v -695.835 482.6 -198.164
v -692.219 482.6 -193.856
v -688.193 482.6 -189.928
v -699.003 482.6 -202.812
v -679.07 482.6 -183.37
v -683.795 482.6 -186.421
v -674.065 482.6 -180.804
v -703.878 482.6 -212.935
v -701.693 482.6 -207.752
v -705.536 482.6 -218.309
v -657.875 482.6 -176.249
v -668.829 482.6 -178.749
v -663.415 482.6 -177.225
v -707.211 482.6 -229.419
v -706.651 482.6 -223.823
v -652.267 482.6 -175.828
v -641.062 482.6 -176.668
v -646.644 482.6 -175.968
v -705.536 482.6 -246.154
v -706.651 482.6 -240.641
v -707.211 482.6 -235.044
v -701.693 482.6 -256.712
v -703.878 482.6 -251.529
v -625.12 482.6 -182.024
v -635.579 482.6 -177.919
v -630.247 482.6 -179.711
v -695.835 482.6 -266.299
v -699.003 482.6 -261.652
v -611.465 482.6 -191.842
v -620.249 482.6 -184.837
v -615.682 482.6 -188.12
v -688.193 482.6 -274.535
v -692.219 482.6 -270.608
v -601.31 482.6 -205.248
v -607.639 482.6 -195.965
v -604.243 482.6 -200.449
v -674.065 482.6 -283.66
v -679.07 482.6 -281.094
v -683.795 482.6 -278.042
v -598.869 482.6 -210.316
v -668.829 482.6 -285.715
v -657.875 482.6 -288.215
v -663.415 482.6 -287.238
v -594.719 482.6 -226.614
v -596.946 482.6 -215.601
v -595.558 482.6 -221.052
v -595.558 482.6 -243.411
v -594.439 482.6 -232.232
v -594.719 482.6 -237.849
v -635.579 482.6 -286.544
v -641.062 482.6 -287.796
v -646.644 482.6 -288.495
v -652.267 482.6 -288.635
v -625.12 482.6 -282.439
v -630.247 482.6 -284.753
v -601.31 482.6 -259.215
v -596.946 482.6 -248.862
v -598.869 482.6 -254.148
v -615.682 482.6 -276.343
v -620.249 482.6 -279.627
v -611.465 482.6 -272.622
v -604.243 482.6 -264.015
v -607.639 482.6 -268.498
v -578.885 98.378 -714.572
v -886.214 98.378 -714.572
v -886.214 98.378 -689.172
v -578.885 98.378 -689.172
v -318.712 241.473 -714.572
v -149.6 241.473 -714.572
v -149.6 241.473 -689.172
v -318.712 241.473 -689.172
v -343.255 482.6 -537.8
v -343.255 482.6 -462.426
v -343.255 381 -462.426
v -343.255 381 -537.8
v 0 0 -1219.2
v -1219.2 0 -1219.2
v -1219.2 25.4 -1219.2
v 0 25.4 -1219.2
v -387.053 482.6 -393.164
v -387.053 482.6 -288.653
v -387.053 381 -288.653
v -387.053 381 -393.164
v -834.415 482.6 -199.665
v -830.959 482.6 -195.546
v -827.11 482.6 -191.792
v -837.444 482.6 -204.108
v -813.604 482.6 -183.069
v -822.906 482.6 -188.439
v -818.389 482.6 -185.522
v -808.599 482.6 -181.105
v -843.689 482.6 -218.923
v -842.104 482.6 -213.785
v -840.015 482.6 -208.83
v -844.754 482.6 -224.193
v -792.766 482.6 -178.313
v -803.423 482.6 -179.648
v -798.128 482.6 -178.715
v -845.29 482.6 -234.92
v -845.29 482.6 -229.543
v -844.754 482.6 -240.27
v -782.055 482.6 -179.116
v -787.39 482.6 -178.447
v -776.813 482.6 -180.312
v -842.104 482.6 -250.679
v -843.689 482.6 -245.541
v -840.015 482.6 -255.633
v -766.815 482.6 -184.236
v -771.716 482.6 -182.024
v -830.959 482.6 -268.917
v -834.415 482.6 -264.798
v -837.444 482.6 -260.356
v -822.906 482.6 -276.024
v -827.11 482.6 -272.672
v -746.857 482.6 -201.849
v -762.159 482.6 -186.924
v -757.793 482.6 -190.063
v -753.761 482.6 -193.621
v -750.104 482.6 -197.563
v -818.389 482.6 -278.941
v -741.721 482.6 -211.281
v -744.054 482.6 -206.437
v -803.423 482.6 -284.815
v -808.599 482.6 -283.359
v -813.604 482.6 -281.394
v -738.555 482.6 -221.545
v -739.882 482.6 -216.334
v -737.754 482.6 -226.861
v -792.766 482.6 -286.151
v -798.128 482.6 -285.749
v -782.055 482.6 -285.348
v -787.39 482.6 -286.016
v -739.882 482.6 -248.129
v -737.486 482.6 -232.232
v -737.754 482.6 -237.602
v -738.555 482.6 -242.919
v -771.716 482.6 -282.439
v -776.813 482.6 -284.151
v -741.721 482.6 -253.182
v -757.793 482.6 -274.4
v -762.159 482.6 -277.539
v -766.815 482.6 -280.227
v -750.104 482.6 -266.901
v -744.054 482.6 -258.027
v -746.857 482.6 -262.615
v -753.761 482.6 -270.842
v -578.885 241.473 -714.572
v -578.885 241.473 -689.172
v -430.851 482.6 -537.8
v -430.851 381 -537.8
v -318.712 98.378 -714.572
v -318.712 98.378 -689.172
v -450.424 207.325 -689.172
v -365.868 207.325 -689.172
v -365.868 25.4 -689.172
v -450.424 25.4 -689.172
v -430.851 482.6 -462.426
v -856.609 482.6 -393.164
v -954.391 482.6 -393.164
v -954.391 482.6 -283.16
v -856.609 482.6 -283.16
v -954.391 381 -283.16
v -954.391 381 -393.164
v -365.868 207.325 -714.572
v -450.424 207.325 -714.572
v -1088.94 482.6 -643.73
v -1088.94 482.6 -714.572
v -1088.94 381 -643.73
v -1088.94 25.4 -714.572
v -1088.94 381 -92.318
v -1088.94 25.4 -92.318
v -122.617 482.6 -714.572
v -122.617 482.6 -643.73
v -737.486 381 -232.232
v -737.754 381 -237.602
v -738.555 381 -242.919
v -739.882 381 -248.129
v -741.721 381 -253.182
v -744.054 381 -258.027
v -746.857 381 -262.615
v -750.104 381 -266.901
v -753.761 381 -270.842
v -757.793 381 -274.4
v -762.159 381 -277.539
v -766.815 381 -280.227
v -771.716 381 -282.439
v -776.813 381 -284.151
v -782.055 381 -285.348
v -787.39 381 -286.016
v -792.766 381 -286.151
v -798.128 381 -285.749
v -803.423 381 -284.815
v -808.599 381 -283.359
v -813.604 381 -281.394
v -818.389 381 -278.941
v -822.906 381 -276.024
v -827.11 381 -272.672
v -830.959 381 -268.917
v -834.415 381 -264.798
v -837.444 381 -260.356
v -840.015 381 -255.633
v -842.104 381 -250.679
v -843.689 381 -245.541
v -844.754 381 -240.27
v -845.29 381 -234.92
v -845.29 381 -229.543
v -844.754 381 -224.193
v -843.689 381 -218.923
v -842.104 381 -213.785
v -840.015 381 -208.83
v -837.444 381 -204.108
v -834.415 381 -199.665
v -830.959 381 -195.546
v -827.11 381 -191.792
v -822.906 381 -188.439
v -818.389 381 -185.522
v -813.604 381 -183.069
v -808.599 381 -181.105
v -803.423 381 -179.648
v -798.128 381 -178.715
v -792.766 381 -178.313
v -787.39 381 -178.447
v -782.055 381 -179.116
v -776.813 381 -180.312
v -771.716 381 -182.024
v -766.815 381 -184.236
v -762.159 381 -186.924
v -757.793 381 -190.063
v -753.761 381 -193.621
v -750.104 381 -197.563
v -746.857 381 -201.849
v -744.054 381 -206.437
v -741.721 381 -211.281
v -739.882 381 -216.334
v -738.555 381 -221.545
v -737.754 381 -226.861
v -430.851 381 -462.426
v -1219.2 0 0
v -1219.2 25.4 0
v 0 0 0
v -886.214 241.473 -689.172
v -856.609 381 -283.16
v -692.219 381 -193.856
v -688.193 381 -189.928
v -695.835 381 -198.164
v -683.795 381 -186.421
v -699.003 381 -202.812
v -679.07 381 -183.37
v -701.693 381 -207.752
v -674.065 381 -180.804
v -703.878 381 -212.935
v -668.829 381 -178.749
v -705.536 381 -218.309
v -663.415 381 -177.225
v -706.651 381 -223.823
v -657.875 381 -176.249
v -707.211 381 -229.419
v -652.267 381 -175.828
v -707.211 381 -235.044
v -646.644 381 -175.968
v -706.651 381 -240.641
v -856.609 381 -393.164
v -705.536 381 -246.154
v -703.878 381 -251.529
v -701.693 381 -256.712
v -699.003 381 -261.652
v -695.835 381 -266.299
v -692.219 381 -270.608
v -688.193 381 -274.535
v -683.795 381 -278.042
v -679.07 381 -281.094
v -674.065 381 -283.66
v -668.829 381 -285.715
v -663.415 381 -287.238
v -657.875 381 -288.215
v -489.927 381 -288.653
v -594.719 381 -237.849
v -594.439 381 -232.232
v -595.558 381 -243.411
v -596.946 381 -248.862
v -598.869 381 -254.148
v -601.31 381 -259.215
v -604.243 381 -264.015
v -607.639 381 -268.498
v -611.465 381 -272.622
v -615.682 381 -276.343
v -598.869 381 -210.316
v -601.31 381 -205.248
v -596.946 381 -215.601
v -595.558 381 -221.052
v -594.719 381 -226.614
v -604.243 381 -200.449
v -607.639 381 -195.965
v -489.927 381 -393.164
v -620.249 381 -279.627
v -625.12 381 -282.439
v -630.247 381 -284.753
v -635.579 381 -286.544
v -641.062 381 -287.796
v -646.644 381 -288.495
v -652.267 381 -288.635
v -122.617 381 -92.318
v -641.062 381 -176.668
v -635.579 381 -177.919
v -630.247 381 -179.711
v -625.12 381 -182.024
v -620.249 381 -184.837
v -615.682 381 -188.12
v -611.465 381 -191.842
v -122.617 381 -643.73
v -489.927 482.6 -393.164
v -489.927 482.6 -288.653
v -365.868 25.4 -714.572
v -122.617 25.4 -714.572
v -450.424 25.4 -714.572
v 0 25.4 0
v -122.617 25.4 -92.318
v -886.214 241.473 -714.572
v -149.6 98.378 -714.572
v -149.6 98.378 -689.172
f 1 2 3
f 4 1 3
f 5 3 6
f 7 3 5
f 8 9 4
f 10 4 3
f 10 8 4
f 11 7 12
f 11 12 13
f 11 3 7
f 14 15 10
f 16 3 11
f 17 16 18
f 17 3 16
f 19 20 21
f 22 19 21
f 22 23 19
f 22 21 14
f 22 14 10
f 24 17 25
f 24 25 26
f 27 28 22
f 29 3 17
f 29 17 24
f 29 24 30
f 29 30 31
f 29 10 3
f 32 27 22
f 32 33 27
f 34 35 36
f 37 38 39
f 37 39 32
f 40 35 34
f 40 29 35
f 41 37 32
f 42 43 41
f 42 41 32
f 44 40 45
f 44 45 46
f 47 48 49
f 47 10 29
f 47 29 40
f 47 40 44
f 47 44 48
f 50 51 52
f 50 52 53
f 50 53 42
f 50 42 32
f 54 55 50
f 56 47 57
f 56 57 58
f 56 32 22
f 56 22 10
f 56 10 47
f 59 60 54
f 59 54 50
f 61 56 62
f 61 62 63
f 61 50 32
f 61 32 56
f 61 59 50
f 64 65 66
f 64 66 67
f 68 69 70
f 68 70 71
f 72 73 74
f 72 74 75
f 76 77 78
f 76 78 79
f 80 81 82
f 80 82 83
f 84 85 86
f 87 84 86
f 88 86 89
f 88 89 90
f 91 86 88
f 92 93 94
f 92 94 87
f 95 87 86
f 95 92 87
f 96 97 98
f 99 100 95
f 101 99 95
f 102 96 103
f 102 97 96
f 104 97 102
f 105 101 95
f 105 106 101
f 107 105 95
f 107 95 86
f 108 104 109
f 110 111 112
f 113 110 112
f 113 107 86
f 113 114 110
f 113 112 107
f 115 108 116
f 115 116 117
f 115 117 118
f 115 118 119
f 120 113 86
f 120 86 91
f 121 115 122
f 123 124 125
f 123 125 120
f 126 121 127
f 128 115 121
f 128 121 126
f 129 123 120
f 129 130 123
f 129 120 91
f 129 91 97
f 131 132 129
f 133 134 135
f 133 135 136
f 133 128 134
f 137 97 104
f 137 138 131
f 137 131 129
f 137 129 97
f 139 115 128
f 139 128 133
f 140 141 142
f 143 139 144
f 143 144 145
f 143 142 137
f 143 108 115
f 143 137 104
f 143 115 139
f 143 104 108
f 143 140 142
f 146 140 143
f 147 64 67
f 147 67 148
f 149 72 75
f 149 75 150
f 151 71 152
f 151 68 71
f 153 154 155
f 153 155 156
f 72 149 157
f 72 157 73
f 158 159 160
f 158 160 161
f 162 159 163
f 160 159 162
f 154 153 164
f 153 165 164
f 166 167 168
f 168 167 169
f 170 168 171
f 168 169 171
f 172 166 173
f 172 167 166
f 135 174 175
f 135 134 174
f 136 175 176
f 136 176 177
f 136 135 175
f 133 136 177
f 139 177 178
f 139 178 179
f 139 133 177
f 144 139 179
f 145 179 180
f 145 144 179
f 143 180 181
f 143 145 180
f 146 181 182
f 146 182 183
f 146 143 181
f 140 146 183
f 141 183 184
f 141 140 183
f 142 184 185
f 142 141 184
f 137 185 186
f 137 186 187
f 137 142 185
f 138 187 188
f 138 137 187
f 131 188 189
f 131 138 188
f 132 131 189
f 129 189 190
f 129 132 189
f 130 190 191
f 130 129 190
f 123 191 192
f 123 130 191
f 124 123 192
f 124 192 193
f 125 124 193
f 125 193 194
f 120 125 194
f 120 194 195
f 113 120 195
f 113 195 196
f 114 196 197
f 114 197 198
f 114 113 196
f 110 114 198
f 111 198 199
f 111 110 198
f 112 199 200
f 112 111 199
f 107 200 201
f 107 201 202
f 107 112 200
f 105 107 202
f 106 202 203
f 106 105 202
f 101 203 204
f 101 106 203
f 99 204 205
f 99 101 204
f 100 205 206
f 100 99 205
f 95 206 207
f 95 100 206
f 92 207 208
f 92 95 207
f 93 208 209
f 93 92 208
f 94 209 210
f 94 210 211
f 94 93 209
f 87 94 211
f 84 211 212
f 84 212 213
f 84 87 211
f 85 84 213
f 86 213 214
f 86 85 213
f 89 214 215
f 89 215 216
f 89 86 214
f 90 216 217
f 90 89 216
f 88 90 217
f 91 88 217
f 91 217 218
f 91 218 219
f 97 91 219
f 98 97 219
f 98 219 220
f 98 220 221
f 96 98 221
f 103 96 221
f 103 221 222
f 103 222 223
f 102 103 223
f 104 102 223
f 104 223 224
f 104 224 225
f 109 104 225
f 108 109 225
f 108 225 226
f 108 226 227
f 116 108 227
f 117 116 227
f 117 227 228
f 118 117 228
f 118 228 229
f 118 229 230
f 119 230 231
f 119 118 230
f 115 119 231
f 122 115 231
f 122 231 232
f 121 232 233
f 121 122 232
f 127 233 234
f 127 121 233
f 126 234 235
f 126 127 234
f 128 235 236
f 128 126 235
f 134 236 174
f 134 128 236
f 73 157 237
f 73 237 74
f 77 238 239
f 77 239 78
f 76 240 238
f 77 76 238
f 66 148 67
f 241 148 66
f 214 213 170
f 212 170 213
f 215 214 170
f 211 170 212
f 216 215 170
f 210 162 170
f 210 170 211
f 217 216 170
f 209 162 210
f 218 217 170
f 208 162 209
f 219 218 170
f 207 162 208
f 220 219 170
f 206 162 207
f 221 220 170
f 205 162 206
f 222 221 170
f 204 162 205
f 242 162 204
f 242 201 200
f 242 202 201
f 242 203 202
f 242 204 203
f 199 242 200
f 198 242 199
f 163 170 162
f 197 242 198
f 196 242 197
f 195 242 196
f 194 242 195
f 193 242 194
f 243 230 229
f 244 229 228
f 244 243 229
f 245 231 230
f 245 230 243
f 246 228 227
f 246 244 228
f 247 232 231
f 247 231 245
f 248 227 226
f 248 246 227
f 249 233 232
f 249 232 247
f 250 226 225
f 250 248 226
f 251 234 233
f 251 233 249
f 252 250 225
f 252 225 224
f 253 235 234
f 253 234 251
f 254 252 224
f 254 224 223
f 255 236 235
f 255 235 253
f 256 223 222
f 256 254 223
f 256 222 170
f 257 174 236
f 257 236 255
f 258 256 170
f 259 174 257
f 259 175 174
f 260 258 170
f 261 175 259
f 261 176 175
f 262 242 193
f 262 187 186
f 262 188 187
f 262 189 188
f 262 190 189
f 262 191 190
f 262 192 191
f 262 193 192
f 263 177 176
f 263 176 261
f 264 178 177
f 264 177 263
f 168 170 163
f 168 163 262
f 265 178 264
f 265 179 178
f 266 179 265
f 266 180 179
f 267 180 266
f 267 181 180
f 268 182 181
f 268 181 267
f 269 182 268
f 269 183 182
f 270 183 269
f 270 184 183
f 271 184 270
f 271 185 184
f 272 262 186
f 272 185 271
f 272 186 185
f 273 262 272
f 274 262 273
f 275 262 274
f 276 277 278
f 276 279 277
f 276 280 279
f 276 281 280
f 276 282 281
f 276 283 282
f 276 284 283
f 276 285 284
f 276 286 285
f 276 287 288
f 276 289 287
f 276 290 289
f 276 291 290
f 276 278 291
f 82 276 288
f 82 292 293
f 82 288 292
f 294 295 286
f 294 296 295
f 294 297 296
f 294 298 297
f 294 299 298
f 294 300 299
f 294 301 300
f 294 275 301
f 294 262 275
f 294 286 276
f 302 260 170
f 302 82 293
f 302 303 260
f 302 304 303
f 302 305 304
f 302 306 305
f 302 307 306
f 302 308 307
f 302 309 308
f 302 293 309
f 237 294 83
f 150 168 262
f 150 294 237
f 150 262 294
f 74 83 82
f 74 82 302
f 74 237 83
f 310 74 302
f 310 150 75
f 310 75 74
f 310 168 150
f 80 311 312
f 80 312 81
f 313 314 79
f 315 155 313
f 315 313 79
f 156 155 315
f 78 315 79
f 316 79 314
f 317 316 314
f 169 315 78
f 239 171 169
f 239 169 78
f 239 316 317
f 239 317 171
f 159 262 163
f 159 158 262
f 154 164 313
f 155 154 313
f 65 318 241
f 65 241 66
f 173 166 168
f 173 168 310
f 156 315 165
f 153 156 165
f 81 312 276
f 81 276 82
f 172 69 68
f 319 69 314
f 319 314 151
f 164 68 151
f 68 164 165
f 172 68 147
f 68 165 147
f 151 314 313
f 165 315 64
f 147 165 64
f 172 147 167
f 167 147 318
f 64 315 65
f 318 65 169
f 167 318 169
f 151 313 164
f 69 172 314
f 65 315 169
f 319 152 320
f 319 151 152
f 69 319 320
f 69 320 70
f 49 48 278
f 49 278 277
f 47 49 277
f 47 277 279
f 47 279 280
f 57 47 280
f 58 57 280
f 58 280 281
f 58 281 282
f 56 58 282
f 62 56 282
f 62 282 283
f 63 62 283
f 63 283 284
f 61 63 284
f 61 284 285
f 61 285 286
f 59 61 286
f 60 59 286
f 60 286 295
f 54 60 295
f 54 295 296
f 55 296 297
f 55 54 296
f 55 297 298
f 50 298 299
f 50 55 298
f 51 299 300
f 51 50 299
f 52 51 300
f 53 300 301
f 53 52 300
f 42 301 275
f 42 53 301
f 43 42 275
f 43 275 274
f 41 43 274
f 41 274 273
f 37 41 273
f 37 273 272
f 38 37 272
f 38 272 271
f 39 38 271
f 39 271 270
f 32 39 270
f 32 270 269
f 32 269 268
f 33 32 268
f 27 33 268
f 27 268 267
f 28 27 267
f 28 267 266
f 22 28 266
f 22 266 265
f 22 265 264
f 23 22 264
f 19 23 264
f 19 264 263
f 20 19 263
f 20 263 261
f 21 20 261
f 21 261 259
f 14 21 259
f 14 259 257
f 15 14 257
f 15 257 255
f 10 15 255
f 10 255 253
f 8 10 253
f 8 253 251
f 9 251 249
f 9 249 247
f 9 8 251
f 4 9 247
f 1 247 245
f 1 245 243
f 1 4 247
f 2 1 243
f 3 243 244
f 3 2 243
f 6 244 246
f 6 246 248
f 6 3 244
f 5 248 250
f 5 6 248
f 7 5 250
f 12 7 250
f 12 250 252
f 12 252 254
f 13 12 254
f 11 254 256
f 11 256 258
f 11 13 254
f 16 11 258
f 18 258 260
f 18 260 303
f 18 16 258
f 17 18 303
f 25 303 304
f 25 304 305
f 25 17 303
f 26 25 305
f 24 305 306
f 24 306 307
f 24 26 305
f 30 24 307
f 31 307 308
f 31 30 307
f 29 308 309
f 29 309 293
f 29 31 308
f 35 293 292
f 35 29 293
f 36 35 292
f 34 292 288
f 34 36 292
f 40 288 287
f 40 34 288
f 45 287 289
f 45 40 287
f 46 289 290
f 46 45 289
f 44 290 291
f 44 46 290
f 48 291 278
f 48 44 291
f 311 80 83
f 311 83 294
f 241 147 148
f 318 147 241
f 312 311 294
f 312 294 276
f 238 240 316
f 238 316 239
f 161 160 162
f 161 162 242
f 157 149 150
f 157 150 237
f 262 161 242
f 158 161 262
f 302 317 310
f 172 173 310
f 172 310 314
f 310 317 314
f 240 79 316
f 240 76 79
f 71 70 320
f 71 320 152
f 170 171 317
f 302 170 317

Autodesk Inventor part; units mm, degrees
ref_plane "YZ Plane" through (0, 0, 0) normal (1, 0, 0) x (0, 1, 0)
ref_plane "XZ Plane" through (0, 0, 0) normal (0, 1, 0) x (-1, 0, 0)
ref_plane "XY Plane" through (0, 0, 0) normal (0, 0, 1) x (1, 0, 0)
sketch "Sketch1" plane through (0, 0, 0) normal (0, 1, 0) x (-1, 0, 0)
  line L0 (0, 0) -> (1219.2, 0)
  line L1 (1219.2, 0) -> (1219.2, -1219.2)
  line L2 (1219.2, -1219.2) -> (0, -1219.2)
  line L3 (0, -1219.2) -> (0, 0)
  dimension "d0" = 1219.2
  dimension "d1" = 1219.2
extrude "Extrusion1" add sketch "Sketch1" along normal blind 25.4
sketch "Sketch2" plane through (0, 25.4, 0) normal (0, 1, 0) x (1, 0, 0)
  line L0 (-1088.9403, 92.3181) -> (-122.6171, 92.3181)
  line L1 (-122.6171, 92.3181) -> (-122.6171, 714.5717)
  line L2 (-122.6171, 714.5717) -> (-1088.9403, 714.5717)
  line L3 (-1088.9403, 714.5717) -> (-1088.9403, 92.3181)
  point P0 (0, 0)
extrude "Extrusion2" add sketch "Sketch2" along normal blind 457.2
sketch "Sketch3" plane through (0, 482.6, 0) normal (0, 1, 0) x (1, 0, 0)
  line L0 (-1088.9403, 92.3181) -> (-1088.9403, 714.5717) projected
  line L1 (-122.6171, 92.3181) -> (-122.6171, 714.5717) projected
  line L2 (-1088.9403, 643.7299) -> (-122.6171, 643.7299)
  line L3 (-122.6171, 643.7299) -> (-122.6171, 92.3181)
  line L4 (-122.6171, 92.3181) -> (-1088.9403, 92.3181)
  line L5 (-1088.9403, 92.3181) -> (-1088.9403, 643.7299)
  line L6 (-954.3907, 283.1597) -> (-856.609, 283.1597)
  line L7 (-856.609, 283.1597) -> (-856.609, 393.1642)
  line L8 (-856.609, 393.1642) -> (-954.3907, 393.1642)
  line L9 (-954.3907, 393.1642) -> (-954.3907, 283.1597)
  line L10 (-430.8509, 462.4262) -> (-343.2547, 462.4262)
  line L11 (-343.2547, 462.4262) -> (-343.2547, 537.7997)
  line L12 (-343.2547, 537.7997) -> (-430.8509, 537.7997)
  line L13 (-430.8509, 537.7997) -> (-430.8509, 462.4262)
  circle A0 centre (-791.4211, 232.2317) radius 53.9356
  circle A1 centre (-650.8599, 232.2317) radius 56.421
  line L14 (-489.9274, 288.6527) -> (-387.0528, 288.6527)
  line L15 (-387.0528, 288.6527) -> (-387.0528, 393.1642)
  line L16 (-387.0528, 393.1642) -> (-489.9274, 393.1642)
  line L17 (-489.9274, 393.1642) -> (-489.9274, 288.6527)
  point P0 (0, 0)
extrude "Extrusion3" cut sketch "Sketch3" against normal blind 101.6
sketch "Sketch4" plane through (-122.6171, 25.4, -714.5717) normal (0, 0, -1) x (-1, 0, 0)
  line L0 (0, 0) -> (966.3232, 0) projected
  line L1 (243.2512, 0) -> (327.8074, 0)
  line L2 (327.8074, 0) -> (327.8074, 181.9254)
  line L3 (327.8074, 181.9254) -> (243.2512, 181.9254)
  line L4 (243.2512, 181.9254) -> (243.2512, 0)
  line L5 (456.2679, 216.0731) -> (763.5973, 216.0731)
  line L6 (763.5973, 216.0731) -> (763.5973, 72.9779)
  line L7 (763.5973, 72.9779) -> (456.2679, 72.9779)
  line L8 (456.2679, 72.9779) -> (456.2679, 216.0731)
  line L9 (26.9824, 216.0731) -> (196.0948, 216.0731)
  line L10 (196.0948, 216.0731) -> (196.0948, 72.9779)
  line L11 (196.0948, 72.9779) -> (26.9824, 72.9779)
  line L12 (26.9824, 72.9779) -> (26.9824, 216.0731)
  point P0 (-122.6171, -25.4)
extrude "Extrusion4" cut sketch "Sketch4" against normal blind 25.4
equation "\"d1\" = d0"
properties part number "building_1" material "Wood (Oak)"
